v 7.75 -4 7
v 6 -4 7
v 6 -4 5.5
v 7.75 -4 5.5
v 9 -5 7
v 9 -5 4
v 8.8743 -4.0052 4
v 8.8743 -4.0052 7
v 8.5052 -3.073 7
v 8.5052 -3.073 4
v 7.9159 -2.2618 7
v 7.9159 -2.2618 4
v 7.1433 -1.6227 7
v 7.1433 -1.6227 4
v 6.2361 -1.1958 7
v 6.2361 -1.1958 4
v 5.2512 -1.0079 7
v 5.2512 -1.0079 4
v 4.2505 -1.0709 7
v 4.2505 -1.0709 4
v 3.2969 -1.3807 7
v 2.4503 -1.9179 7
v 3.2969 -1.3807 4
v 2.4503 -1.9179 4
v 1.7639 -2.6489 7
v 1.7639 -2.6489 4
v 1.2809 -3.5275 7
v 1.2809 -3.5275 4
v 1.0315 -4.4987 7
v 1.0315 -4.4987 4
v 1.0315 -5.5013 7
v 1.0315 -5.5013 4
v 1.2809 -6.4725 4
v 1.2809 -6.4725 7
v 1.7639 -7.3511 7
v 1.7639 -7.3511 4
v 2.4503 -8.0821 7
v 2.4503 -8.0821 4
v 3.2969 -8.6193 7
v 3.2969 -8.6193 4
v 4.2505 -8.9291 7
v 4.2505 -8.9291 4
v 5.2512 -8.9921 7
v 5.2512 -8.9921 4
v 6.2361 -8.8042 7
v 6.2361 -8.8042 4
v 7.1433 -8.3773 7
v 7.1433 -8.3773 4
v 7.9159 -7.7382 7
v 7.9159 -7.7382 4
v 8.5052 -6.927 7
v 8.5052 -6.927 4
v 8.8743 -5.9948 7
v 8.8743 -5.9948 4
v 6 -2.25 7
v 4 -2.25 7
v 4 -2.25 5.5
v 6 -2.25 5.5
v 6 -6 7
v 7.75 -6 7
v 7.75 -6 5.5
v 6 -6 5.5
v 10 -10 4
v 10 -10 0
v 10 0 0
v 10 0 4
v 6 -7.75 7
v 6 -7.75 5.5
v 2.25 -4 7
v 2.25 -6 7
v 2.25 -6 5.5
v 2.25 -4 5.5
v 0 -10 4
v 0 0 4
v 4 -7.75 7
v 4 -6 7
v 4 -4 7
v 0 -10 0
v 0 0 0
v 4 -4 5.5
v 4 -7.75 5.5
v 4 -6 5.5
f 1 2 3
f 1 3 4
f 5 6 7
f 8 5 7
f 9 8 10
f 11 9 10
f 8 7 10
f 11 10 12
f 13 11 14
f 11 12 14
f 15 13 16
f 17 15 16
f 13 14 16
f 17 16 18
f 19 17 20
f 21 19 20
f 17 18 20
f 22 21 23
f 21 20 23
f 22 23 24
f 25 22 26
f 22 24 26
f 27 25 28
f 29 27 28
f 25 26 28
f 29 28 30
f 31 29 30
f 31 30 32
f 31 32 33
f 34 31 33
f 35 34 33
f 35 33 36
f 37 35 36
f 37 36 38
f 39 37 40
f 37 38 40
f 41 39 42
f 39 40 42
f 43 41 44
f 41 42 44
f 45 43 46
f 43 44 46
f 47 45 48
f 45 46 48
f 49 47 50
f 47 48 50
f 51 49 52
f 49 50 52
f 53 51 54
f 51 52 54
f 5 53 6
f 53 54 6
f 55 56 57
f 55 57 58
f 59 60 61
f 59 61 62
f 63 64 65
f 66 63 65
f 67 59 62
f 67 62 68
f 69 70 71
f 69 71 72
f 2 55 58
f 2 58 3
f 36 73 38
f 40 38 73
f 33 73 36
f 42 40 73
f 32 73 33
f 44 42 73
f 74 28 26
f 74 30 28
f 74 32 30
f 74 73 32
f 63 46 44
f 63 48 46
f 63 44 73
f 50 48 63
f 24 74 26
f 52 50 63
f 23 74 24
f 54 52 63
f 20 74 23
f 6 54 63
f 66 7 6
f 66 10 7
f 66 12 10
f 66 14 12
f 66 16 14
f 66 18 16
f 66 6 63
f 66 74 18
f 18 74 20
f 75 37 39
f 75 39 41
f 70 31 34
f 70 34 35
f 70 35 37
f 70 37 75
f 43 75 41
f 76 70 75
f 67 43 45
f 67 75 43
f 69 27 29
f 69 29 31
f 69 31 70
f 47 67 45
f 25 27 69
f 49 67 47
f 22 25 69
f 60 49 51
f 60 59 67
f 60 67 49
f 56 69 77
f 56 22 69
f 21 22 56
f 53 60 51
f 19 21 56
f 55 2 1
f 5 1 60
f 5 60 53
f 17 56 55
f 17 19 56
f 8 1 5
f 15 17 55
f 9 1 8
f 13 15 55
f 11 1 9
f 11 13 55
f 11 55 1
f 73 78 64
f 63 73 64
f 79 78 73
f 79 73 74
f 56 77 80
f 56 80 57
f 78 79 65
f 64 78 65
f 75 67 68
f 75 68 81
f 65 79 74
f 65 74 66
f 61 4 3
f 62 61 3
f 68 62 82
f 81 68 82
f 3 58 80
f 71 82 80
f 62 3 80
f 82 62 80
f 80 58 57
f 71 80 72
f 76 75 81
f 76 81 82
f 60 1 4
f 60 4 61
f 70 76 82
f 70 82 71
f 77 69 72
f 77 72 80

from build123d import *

# Parameters (mm, degrees)
SKETCH1_W           = 10
SKETCH1_H           = 10
BOSS_EXTRUDE1_DEPTH = 4
SKETCH2_R           = 4
BOSS_EXTRUDE2_DEPTH = 3
CUT_EXTRUDE1_DEPTH  = 1.5


with BuildPart() as part:
    # Sketch1 → Boss-Extrude1 (new body)
    with BuildSketch(Plane.XY):
        with Locations((5, -5)):
            Rectangle(SKETCH1_W, SKETCH1_H)
    extrude(amount=BOSS_EXTRUDE1_DEPTH)

    # Sketch2 → Boss-Extrude2 (add)
    with BuildSketch(Plane.XY.offset(4)):
        with Locations((5, -5)):
            Circle(SKETCH2_R)
    extrude(amount=BOSS_EXTRUDE2_DEPTH)

    # Sketch3 → Cut-Extrude1 (cut)
    with BuildSketch(Plane.XY.offset(7)):
        Polygon((4, -4), (4, -2.25), (6, -2.25), (6, -4), (7.75, -4), (7.75, -6), (6, -6), (6, -7.75), (4, -7.75), (4, -6), (2.25, -6), (2.25, -4), align=None)
    extrude(amount=-CUT_EXTRUDE1_DEPTH, mode=Mode.SUBTRACT)


solid = part.part
